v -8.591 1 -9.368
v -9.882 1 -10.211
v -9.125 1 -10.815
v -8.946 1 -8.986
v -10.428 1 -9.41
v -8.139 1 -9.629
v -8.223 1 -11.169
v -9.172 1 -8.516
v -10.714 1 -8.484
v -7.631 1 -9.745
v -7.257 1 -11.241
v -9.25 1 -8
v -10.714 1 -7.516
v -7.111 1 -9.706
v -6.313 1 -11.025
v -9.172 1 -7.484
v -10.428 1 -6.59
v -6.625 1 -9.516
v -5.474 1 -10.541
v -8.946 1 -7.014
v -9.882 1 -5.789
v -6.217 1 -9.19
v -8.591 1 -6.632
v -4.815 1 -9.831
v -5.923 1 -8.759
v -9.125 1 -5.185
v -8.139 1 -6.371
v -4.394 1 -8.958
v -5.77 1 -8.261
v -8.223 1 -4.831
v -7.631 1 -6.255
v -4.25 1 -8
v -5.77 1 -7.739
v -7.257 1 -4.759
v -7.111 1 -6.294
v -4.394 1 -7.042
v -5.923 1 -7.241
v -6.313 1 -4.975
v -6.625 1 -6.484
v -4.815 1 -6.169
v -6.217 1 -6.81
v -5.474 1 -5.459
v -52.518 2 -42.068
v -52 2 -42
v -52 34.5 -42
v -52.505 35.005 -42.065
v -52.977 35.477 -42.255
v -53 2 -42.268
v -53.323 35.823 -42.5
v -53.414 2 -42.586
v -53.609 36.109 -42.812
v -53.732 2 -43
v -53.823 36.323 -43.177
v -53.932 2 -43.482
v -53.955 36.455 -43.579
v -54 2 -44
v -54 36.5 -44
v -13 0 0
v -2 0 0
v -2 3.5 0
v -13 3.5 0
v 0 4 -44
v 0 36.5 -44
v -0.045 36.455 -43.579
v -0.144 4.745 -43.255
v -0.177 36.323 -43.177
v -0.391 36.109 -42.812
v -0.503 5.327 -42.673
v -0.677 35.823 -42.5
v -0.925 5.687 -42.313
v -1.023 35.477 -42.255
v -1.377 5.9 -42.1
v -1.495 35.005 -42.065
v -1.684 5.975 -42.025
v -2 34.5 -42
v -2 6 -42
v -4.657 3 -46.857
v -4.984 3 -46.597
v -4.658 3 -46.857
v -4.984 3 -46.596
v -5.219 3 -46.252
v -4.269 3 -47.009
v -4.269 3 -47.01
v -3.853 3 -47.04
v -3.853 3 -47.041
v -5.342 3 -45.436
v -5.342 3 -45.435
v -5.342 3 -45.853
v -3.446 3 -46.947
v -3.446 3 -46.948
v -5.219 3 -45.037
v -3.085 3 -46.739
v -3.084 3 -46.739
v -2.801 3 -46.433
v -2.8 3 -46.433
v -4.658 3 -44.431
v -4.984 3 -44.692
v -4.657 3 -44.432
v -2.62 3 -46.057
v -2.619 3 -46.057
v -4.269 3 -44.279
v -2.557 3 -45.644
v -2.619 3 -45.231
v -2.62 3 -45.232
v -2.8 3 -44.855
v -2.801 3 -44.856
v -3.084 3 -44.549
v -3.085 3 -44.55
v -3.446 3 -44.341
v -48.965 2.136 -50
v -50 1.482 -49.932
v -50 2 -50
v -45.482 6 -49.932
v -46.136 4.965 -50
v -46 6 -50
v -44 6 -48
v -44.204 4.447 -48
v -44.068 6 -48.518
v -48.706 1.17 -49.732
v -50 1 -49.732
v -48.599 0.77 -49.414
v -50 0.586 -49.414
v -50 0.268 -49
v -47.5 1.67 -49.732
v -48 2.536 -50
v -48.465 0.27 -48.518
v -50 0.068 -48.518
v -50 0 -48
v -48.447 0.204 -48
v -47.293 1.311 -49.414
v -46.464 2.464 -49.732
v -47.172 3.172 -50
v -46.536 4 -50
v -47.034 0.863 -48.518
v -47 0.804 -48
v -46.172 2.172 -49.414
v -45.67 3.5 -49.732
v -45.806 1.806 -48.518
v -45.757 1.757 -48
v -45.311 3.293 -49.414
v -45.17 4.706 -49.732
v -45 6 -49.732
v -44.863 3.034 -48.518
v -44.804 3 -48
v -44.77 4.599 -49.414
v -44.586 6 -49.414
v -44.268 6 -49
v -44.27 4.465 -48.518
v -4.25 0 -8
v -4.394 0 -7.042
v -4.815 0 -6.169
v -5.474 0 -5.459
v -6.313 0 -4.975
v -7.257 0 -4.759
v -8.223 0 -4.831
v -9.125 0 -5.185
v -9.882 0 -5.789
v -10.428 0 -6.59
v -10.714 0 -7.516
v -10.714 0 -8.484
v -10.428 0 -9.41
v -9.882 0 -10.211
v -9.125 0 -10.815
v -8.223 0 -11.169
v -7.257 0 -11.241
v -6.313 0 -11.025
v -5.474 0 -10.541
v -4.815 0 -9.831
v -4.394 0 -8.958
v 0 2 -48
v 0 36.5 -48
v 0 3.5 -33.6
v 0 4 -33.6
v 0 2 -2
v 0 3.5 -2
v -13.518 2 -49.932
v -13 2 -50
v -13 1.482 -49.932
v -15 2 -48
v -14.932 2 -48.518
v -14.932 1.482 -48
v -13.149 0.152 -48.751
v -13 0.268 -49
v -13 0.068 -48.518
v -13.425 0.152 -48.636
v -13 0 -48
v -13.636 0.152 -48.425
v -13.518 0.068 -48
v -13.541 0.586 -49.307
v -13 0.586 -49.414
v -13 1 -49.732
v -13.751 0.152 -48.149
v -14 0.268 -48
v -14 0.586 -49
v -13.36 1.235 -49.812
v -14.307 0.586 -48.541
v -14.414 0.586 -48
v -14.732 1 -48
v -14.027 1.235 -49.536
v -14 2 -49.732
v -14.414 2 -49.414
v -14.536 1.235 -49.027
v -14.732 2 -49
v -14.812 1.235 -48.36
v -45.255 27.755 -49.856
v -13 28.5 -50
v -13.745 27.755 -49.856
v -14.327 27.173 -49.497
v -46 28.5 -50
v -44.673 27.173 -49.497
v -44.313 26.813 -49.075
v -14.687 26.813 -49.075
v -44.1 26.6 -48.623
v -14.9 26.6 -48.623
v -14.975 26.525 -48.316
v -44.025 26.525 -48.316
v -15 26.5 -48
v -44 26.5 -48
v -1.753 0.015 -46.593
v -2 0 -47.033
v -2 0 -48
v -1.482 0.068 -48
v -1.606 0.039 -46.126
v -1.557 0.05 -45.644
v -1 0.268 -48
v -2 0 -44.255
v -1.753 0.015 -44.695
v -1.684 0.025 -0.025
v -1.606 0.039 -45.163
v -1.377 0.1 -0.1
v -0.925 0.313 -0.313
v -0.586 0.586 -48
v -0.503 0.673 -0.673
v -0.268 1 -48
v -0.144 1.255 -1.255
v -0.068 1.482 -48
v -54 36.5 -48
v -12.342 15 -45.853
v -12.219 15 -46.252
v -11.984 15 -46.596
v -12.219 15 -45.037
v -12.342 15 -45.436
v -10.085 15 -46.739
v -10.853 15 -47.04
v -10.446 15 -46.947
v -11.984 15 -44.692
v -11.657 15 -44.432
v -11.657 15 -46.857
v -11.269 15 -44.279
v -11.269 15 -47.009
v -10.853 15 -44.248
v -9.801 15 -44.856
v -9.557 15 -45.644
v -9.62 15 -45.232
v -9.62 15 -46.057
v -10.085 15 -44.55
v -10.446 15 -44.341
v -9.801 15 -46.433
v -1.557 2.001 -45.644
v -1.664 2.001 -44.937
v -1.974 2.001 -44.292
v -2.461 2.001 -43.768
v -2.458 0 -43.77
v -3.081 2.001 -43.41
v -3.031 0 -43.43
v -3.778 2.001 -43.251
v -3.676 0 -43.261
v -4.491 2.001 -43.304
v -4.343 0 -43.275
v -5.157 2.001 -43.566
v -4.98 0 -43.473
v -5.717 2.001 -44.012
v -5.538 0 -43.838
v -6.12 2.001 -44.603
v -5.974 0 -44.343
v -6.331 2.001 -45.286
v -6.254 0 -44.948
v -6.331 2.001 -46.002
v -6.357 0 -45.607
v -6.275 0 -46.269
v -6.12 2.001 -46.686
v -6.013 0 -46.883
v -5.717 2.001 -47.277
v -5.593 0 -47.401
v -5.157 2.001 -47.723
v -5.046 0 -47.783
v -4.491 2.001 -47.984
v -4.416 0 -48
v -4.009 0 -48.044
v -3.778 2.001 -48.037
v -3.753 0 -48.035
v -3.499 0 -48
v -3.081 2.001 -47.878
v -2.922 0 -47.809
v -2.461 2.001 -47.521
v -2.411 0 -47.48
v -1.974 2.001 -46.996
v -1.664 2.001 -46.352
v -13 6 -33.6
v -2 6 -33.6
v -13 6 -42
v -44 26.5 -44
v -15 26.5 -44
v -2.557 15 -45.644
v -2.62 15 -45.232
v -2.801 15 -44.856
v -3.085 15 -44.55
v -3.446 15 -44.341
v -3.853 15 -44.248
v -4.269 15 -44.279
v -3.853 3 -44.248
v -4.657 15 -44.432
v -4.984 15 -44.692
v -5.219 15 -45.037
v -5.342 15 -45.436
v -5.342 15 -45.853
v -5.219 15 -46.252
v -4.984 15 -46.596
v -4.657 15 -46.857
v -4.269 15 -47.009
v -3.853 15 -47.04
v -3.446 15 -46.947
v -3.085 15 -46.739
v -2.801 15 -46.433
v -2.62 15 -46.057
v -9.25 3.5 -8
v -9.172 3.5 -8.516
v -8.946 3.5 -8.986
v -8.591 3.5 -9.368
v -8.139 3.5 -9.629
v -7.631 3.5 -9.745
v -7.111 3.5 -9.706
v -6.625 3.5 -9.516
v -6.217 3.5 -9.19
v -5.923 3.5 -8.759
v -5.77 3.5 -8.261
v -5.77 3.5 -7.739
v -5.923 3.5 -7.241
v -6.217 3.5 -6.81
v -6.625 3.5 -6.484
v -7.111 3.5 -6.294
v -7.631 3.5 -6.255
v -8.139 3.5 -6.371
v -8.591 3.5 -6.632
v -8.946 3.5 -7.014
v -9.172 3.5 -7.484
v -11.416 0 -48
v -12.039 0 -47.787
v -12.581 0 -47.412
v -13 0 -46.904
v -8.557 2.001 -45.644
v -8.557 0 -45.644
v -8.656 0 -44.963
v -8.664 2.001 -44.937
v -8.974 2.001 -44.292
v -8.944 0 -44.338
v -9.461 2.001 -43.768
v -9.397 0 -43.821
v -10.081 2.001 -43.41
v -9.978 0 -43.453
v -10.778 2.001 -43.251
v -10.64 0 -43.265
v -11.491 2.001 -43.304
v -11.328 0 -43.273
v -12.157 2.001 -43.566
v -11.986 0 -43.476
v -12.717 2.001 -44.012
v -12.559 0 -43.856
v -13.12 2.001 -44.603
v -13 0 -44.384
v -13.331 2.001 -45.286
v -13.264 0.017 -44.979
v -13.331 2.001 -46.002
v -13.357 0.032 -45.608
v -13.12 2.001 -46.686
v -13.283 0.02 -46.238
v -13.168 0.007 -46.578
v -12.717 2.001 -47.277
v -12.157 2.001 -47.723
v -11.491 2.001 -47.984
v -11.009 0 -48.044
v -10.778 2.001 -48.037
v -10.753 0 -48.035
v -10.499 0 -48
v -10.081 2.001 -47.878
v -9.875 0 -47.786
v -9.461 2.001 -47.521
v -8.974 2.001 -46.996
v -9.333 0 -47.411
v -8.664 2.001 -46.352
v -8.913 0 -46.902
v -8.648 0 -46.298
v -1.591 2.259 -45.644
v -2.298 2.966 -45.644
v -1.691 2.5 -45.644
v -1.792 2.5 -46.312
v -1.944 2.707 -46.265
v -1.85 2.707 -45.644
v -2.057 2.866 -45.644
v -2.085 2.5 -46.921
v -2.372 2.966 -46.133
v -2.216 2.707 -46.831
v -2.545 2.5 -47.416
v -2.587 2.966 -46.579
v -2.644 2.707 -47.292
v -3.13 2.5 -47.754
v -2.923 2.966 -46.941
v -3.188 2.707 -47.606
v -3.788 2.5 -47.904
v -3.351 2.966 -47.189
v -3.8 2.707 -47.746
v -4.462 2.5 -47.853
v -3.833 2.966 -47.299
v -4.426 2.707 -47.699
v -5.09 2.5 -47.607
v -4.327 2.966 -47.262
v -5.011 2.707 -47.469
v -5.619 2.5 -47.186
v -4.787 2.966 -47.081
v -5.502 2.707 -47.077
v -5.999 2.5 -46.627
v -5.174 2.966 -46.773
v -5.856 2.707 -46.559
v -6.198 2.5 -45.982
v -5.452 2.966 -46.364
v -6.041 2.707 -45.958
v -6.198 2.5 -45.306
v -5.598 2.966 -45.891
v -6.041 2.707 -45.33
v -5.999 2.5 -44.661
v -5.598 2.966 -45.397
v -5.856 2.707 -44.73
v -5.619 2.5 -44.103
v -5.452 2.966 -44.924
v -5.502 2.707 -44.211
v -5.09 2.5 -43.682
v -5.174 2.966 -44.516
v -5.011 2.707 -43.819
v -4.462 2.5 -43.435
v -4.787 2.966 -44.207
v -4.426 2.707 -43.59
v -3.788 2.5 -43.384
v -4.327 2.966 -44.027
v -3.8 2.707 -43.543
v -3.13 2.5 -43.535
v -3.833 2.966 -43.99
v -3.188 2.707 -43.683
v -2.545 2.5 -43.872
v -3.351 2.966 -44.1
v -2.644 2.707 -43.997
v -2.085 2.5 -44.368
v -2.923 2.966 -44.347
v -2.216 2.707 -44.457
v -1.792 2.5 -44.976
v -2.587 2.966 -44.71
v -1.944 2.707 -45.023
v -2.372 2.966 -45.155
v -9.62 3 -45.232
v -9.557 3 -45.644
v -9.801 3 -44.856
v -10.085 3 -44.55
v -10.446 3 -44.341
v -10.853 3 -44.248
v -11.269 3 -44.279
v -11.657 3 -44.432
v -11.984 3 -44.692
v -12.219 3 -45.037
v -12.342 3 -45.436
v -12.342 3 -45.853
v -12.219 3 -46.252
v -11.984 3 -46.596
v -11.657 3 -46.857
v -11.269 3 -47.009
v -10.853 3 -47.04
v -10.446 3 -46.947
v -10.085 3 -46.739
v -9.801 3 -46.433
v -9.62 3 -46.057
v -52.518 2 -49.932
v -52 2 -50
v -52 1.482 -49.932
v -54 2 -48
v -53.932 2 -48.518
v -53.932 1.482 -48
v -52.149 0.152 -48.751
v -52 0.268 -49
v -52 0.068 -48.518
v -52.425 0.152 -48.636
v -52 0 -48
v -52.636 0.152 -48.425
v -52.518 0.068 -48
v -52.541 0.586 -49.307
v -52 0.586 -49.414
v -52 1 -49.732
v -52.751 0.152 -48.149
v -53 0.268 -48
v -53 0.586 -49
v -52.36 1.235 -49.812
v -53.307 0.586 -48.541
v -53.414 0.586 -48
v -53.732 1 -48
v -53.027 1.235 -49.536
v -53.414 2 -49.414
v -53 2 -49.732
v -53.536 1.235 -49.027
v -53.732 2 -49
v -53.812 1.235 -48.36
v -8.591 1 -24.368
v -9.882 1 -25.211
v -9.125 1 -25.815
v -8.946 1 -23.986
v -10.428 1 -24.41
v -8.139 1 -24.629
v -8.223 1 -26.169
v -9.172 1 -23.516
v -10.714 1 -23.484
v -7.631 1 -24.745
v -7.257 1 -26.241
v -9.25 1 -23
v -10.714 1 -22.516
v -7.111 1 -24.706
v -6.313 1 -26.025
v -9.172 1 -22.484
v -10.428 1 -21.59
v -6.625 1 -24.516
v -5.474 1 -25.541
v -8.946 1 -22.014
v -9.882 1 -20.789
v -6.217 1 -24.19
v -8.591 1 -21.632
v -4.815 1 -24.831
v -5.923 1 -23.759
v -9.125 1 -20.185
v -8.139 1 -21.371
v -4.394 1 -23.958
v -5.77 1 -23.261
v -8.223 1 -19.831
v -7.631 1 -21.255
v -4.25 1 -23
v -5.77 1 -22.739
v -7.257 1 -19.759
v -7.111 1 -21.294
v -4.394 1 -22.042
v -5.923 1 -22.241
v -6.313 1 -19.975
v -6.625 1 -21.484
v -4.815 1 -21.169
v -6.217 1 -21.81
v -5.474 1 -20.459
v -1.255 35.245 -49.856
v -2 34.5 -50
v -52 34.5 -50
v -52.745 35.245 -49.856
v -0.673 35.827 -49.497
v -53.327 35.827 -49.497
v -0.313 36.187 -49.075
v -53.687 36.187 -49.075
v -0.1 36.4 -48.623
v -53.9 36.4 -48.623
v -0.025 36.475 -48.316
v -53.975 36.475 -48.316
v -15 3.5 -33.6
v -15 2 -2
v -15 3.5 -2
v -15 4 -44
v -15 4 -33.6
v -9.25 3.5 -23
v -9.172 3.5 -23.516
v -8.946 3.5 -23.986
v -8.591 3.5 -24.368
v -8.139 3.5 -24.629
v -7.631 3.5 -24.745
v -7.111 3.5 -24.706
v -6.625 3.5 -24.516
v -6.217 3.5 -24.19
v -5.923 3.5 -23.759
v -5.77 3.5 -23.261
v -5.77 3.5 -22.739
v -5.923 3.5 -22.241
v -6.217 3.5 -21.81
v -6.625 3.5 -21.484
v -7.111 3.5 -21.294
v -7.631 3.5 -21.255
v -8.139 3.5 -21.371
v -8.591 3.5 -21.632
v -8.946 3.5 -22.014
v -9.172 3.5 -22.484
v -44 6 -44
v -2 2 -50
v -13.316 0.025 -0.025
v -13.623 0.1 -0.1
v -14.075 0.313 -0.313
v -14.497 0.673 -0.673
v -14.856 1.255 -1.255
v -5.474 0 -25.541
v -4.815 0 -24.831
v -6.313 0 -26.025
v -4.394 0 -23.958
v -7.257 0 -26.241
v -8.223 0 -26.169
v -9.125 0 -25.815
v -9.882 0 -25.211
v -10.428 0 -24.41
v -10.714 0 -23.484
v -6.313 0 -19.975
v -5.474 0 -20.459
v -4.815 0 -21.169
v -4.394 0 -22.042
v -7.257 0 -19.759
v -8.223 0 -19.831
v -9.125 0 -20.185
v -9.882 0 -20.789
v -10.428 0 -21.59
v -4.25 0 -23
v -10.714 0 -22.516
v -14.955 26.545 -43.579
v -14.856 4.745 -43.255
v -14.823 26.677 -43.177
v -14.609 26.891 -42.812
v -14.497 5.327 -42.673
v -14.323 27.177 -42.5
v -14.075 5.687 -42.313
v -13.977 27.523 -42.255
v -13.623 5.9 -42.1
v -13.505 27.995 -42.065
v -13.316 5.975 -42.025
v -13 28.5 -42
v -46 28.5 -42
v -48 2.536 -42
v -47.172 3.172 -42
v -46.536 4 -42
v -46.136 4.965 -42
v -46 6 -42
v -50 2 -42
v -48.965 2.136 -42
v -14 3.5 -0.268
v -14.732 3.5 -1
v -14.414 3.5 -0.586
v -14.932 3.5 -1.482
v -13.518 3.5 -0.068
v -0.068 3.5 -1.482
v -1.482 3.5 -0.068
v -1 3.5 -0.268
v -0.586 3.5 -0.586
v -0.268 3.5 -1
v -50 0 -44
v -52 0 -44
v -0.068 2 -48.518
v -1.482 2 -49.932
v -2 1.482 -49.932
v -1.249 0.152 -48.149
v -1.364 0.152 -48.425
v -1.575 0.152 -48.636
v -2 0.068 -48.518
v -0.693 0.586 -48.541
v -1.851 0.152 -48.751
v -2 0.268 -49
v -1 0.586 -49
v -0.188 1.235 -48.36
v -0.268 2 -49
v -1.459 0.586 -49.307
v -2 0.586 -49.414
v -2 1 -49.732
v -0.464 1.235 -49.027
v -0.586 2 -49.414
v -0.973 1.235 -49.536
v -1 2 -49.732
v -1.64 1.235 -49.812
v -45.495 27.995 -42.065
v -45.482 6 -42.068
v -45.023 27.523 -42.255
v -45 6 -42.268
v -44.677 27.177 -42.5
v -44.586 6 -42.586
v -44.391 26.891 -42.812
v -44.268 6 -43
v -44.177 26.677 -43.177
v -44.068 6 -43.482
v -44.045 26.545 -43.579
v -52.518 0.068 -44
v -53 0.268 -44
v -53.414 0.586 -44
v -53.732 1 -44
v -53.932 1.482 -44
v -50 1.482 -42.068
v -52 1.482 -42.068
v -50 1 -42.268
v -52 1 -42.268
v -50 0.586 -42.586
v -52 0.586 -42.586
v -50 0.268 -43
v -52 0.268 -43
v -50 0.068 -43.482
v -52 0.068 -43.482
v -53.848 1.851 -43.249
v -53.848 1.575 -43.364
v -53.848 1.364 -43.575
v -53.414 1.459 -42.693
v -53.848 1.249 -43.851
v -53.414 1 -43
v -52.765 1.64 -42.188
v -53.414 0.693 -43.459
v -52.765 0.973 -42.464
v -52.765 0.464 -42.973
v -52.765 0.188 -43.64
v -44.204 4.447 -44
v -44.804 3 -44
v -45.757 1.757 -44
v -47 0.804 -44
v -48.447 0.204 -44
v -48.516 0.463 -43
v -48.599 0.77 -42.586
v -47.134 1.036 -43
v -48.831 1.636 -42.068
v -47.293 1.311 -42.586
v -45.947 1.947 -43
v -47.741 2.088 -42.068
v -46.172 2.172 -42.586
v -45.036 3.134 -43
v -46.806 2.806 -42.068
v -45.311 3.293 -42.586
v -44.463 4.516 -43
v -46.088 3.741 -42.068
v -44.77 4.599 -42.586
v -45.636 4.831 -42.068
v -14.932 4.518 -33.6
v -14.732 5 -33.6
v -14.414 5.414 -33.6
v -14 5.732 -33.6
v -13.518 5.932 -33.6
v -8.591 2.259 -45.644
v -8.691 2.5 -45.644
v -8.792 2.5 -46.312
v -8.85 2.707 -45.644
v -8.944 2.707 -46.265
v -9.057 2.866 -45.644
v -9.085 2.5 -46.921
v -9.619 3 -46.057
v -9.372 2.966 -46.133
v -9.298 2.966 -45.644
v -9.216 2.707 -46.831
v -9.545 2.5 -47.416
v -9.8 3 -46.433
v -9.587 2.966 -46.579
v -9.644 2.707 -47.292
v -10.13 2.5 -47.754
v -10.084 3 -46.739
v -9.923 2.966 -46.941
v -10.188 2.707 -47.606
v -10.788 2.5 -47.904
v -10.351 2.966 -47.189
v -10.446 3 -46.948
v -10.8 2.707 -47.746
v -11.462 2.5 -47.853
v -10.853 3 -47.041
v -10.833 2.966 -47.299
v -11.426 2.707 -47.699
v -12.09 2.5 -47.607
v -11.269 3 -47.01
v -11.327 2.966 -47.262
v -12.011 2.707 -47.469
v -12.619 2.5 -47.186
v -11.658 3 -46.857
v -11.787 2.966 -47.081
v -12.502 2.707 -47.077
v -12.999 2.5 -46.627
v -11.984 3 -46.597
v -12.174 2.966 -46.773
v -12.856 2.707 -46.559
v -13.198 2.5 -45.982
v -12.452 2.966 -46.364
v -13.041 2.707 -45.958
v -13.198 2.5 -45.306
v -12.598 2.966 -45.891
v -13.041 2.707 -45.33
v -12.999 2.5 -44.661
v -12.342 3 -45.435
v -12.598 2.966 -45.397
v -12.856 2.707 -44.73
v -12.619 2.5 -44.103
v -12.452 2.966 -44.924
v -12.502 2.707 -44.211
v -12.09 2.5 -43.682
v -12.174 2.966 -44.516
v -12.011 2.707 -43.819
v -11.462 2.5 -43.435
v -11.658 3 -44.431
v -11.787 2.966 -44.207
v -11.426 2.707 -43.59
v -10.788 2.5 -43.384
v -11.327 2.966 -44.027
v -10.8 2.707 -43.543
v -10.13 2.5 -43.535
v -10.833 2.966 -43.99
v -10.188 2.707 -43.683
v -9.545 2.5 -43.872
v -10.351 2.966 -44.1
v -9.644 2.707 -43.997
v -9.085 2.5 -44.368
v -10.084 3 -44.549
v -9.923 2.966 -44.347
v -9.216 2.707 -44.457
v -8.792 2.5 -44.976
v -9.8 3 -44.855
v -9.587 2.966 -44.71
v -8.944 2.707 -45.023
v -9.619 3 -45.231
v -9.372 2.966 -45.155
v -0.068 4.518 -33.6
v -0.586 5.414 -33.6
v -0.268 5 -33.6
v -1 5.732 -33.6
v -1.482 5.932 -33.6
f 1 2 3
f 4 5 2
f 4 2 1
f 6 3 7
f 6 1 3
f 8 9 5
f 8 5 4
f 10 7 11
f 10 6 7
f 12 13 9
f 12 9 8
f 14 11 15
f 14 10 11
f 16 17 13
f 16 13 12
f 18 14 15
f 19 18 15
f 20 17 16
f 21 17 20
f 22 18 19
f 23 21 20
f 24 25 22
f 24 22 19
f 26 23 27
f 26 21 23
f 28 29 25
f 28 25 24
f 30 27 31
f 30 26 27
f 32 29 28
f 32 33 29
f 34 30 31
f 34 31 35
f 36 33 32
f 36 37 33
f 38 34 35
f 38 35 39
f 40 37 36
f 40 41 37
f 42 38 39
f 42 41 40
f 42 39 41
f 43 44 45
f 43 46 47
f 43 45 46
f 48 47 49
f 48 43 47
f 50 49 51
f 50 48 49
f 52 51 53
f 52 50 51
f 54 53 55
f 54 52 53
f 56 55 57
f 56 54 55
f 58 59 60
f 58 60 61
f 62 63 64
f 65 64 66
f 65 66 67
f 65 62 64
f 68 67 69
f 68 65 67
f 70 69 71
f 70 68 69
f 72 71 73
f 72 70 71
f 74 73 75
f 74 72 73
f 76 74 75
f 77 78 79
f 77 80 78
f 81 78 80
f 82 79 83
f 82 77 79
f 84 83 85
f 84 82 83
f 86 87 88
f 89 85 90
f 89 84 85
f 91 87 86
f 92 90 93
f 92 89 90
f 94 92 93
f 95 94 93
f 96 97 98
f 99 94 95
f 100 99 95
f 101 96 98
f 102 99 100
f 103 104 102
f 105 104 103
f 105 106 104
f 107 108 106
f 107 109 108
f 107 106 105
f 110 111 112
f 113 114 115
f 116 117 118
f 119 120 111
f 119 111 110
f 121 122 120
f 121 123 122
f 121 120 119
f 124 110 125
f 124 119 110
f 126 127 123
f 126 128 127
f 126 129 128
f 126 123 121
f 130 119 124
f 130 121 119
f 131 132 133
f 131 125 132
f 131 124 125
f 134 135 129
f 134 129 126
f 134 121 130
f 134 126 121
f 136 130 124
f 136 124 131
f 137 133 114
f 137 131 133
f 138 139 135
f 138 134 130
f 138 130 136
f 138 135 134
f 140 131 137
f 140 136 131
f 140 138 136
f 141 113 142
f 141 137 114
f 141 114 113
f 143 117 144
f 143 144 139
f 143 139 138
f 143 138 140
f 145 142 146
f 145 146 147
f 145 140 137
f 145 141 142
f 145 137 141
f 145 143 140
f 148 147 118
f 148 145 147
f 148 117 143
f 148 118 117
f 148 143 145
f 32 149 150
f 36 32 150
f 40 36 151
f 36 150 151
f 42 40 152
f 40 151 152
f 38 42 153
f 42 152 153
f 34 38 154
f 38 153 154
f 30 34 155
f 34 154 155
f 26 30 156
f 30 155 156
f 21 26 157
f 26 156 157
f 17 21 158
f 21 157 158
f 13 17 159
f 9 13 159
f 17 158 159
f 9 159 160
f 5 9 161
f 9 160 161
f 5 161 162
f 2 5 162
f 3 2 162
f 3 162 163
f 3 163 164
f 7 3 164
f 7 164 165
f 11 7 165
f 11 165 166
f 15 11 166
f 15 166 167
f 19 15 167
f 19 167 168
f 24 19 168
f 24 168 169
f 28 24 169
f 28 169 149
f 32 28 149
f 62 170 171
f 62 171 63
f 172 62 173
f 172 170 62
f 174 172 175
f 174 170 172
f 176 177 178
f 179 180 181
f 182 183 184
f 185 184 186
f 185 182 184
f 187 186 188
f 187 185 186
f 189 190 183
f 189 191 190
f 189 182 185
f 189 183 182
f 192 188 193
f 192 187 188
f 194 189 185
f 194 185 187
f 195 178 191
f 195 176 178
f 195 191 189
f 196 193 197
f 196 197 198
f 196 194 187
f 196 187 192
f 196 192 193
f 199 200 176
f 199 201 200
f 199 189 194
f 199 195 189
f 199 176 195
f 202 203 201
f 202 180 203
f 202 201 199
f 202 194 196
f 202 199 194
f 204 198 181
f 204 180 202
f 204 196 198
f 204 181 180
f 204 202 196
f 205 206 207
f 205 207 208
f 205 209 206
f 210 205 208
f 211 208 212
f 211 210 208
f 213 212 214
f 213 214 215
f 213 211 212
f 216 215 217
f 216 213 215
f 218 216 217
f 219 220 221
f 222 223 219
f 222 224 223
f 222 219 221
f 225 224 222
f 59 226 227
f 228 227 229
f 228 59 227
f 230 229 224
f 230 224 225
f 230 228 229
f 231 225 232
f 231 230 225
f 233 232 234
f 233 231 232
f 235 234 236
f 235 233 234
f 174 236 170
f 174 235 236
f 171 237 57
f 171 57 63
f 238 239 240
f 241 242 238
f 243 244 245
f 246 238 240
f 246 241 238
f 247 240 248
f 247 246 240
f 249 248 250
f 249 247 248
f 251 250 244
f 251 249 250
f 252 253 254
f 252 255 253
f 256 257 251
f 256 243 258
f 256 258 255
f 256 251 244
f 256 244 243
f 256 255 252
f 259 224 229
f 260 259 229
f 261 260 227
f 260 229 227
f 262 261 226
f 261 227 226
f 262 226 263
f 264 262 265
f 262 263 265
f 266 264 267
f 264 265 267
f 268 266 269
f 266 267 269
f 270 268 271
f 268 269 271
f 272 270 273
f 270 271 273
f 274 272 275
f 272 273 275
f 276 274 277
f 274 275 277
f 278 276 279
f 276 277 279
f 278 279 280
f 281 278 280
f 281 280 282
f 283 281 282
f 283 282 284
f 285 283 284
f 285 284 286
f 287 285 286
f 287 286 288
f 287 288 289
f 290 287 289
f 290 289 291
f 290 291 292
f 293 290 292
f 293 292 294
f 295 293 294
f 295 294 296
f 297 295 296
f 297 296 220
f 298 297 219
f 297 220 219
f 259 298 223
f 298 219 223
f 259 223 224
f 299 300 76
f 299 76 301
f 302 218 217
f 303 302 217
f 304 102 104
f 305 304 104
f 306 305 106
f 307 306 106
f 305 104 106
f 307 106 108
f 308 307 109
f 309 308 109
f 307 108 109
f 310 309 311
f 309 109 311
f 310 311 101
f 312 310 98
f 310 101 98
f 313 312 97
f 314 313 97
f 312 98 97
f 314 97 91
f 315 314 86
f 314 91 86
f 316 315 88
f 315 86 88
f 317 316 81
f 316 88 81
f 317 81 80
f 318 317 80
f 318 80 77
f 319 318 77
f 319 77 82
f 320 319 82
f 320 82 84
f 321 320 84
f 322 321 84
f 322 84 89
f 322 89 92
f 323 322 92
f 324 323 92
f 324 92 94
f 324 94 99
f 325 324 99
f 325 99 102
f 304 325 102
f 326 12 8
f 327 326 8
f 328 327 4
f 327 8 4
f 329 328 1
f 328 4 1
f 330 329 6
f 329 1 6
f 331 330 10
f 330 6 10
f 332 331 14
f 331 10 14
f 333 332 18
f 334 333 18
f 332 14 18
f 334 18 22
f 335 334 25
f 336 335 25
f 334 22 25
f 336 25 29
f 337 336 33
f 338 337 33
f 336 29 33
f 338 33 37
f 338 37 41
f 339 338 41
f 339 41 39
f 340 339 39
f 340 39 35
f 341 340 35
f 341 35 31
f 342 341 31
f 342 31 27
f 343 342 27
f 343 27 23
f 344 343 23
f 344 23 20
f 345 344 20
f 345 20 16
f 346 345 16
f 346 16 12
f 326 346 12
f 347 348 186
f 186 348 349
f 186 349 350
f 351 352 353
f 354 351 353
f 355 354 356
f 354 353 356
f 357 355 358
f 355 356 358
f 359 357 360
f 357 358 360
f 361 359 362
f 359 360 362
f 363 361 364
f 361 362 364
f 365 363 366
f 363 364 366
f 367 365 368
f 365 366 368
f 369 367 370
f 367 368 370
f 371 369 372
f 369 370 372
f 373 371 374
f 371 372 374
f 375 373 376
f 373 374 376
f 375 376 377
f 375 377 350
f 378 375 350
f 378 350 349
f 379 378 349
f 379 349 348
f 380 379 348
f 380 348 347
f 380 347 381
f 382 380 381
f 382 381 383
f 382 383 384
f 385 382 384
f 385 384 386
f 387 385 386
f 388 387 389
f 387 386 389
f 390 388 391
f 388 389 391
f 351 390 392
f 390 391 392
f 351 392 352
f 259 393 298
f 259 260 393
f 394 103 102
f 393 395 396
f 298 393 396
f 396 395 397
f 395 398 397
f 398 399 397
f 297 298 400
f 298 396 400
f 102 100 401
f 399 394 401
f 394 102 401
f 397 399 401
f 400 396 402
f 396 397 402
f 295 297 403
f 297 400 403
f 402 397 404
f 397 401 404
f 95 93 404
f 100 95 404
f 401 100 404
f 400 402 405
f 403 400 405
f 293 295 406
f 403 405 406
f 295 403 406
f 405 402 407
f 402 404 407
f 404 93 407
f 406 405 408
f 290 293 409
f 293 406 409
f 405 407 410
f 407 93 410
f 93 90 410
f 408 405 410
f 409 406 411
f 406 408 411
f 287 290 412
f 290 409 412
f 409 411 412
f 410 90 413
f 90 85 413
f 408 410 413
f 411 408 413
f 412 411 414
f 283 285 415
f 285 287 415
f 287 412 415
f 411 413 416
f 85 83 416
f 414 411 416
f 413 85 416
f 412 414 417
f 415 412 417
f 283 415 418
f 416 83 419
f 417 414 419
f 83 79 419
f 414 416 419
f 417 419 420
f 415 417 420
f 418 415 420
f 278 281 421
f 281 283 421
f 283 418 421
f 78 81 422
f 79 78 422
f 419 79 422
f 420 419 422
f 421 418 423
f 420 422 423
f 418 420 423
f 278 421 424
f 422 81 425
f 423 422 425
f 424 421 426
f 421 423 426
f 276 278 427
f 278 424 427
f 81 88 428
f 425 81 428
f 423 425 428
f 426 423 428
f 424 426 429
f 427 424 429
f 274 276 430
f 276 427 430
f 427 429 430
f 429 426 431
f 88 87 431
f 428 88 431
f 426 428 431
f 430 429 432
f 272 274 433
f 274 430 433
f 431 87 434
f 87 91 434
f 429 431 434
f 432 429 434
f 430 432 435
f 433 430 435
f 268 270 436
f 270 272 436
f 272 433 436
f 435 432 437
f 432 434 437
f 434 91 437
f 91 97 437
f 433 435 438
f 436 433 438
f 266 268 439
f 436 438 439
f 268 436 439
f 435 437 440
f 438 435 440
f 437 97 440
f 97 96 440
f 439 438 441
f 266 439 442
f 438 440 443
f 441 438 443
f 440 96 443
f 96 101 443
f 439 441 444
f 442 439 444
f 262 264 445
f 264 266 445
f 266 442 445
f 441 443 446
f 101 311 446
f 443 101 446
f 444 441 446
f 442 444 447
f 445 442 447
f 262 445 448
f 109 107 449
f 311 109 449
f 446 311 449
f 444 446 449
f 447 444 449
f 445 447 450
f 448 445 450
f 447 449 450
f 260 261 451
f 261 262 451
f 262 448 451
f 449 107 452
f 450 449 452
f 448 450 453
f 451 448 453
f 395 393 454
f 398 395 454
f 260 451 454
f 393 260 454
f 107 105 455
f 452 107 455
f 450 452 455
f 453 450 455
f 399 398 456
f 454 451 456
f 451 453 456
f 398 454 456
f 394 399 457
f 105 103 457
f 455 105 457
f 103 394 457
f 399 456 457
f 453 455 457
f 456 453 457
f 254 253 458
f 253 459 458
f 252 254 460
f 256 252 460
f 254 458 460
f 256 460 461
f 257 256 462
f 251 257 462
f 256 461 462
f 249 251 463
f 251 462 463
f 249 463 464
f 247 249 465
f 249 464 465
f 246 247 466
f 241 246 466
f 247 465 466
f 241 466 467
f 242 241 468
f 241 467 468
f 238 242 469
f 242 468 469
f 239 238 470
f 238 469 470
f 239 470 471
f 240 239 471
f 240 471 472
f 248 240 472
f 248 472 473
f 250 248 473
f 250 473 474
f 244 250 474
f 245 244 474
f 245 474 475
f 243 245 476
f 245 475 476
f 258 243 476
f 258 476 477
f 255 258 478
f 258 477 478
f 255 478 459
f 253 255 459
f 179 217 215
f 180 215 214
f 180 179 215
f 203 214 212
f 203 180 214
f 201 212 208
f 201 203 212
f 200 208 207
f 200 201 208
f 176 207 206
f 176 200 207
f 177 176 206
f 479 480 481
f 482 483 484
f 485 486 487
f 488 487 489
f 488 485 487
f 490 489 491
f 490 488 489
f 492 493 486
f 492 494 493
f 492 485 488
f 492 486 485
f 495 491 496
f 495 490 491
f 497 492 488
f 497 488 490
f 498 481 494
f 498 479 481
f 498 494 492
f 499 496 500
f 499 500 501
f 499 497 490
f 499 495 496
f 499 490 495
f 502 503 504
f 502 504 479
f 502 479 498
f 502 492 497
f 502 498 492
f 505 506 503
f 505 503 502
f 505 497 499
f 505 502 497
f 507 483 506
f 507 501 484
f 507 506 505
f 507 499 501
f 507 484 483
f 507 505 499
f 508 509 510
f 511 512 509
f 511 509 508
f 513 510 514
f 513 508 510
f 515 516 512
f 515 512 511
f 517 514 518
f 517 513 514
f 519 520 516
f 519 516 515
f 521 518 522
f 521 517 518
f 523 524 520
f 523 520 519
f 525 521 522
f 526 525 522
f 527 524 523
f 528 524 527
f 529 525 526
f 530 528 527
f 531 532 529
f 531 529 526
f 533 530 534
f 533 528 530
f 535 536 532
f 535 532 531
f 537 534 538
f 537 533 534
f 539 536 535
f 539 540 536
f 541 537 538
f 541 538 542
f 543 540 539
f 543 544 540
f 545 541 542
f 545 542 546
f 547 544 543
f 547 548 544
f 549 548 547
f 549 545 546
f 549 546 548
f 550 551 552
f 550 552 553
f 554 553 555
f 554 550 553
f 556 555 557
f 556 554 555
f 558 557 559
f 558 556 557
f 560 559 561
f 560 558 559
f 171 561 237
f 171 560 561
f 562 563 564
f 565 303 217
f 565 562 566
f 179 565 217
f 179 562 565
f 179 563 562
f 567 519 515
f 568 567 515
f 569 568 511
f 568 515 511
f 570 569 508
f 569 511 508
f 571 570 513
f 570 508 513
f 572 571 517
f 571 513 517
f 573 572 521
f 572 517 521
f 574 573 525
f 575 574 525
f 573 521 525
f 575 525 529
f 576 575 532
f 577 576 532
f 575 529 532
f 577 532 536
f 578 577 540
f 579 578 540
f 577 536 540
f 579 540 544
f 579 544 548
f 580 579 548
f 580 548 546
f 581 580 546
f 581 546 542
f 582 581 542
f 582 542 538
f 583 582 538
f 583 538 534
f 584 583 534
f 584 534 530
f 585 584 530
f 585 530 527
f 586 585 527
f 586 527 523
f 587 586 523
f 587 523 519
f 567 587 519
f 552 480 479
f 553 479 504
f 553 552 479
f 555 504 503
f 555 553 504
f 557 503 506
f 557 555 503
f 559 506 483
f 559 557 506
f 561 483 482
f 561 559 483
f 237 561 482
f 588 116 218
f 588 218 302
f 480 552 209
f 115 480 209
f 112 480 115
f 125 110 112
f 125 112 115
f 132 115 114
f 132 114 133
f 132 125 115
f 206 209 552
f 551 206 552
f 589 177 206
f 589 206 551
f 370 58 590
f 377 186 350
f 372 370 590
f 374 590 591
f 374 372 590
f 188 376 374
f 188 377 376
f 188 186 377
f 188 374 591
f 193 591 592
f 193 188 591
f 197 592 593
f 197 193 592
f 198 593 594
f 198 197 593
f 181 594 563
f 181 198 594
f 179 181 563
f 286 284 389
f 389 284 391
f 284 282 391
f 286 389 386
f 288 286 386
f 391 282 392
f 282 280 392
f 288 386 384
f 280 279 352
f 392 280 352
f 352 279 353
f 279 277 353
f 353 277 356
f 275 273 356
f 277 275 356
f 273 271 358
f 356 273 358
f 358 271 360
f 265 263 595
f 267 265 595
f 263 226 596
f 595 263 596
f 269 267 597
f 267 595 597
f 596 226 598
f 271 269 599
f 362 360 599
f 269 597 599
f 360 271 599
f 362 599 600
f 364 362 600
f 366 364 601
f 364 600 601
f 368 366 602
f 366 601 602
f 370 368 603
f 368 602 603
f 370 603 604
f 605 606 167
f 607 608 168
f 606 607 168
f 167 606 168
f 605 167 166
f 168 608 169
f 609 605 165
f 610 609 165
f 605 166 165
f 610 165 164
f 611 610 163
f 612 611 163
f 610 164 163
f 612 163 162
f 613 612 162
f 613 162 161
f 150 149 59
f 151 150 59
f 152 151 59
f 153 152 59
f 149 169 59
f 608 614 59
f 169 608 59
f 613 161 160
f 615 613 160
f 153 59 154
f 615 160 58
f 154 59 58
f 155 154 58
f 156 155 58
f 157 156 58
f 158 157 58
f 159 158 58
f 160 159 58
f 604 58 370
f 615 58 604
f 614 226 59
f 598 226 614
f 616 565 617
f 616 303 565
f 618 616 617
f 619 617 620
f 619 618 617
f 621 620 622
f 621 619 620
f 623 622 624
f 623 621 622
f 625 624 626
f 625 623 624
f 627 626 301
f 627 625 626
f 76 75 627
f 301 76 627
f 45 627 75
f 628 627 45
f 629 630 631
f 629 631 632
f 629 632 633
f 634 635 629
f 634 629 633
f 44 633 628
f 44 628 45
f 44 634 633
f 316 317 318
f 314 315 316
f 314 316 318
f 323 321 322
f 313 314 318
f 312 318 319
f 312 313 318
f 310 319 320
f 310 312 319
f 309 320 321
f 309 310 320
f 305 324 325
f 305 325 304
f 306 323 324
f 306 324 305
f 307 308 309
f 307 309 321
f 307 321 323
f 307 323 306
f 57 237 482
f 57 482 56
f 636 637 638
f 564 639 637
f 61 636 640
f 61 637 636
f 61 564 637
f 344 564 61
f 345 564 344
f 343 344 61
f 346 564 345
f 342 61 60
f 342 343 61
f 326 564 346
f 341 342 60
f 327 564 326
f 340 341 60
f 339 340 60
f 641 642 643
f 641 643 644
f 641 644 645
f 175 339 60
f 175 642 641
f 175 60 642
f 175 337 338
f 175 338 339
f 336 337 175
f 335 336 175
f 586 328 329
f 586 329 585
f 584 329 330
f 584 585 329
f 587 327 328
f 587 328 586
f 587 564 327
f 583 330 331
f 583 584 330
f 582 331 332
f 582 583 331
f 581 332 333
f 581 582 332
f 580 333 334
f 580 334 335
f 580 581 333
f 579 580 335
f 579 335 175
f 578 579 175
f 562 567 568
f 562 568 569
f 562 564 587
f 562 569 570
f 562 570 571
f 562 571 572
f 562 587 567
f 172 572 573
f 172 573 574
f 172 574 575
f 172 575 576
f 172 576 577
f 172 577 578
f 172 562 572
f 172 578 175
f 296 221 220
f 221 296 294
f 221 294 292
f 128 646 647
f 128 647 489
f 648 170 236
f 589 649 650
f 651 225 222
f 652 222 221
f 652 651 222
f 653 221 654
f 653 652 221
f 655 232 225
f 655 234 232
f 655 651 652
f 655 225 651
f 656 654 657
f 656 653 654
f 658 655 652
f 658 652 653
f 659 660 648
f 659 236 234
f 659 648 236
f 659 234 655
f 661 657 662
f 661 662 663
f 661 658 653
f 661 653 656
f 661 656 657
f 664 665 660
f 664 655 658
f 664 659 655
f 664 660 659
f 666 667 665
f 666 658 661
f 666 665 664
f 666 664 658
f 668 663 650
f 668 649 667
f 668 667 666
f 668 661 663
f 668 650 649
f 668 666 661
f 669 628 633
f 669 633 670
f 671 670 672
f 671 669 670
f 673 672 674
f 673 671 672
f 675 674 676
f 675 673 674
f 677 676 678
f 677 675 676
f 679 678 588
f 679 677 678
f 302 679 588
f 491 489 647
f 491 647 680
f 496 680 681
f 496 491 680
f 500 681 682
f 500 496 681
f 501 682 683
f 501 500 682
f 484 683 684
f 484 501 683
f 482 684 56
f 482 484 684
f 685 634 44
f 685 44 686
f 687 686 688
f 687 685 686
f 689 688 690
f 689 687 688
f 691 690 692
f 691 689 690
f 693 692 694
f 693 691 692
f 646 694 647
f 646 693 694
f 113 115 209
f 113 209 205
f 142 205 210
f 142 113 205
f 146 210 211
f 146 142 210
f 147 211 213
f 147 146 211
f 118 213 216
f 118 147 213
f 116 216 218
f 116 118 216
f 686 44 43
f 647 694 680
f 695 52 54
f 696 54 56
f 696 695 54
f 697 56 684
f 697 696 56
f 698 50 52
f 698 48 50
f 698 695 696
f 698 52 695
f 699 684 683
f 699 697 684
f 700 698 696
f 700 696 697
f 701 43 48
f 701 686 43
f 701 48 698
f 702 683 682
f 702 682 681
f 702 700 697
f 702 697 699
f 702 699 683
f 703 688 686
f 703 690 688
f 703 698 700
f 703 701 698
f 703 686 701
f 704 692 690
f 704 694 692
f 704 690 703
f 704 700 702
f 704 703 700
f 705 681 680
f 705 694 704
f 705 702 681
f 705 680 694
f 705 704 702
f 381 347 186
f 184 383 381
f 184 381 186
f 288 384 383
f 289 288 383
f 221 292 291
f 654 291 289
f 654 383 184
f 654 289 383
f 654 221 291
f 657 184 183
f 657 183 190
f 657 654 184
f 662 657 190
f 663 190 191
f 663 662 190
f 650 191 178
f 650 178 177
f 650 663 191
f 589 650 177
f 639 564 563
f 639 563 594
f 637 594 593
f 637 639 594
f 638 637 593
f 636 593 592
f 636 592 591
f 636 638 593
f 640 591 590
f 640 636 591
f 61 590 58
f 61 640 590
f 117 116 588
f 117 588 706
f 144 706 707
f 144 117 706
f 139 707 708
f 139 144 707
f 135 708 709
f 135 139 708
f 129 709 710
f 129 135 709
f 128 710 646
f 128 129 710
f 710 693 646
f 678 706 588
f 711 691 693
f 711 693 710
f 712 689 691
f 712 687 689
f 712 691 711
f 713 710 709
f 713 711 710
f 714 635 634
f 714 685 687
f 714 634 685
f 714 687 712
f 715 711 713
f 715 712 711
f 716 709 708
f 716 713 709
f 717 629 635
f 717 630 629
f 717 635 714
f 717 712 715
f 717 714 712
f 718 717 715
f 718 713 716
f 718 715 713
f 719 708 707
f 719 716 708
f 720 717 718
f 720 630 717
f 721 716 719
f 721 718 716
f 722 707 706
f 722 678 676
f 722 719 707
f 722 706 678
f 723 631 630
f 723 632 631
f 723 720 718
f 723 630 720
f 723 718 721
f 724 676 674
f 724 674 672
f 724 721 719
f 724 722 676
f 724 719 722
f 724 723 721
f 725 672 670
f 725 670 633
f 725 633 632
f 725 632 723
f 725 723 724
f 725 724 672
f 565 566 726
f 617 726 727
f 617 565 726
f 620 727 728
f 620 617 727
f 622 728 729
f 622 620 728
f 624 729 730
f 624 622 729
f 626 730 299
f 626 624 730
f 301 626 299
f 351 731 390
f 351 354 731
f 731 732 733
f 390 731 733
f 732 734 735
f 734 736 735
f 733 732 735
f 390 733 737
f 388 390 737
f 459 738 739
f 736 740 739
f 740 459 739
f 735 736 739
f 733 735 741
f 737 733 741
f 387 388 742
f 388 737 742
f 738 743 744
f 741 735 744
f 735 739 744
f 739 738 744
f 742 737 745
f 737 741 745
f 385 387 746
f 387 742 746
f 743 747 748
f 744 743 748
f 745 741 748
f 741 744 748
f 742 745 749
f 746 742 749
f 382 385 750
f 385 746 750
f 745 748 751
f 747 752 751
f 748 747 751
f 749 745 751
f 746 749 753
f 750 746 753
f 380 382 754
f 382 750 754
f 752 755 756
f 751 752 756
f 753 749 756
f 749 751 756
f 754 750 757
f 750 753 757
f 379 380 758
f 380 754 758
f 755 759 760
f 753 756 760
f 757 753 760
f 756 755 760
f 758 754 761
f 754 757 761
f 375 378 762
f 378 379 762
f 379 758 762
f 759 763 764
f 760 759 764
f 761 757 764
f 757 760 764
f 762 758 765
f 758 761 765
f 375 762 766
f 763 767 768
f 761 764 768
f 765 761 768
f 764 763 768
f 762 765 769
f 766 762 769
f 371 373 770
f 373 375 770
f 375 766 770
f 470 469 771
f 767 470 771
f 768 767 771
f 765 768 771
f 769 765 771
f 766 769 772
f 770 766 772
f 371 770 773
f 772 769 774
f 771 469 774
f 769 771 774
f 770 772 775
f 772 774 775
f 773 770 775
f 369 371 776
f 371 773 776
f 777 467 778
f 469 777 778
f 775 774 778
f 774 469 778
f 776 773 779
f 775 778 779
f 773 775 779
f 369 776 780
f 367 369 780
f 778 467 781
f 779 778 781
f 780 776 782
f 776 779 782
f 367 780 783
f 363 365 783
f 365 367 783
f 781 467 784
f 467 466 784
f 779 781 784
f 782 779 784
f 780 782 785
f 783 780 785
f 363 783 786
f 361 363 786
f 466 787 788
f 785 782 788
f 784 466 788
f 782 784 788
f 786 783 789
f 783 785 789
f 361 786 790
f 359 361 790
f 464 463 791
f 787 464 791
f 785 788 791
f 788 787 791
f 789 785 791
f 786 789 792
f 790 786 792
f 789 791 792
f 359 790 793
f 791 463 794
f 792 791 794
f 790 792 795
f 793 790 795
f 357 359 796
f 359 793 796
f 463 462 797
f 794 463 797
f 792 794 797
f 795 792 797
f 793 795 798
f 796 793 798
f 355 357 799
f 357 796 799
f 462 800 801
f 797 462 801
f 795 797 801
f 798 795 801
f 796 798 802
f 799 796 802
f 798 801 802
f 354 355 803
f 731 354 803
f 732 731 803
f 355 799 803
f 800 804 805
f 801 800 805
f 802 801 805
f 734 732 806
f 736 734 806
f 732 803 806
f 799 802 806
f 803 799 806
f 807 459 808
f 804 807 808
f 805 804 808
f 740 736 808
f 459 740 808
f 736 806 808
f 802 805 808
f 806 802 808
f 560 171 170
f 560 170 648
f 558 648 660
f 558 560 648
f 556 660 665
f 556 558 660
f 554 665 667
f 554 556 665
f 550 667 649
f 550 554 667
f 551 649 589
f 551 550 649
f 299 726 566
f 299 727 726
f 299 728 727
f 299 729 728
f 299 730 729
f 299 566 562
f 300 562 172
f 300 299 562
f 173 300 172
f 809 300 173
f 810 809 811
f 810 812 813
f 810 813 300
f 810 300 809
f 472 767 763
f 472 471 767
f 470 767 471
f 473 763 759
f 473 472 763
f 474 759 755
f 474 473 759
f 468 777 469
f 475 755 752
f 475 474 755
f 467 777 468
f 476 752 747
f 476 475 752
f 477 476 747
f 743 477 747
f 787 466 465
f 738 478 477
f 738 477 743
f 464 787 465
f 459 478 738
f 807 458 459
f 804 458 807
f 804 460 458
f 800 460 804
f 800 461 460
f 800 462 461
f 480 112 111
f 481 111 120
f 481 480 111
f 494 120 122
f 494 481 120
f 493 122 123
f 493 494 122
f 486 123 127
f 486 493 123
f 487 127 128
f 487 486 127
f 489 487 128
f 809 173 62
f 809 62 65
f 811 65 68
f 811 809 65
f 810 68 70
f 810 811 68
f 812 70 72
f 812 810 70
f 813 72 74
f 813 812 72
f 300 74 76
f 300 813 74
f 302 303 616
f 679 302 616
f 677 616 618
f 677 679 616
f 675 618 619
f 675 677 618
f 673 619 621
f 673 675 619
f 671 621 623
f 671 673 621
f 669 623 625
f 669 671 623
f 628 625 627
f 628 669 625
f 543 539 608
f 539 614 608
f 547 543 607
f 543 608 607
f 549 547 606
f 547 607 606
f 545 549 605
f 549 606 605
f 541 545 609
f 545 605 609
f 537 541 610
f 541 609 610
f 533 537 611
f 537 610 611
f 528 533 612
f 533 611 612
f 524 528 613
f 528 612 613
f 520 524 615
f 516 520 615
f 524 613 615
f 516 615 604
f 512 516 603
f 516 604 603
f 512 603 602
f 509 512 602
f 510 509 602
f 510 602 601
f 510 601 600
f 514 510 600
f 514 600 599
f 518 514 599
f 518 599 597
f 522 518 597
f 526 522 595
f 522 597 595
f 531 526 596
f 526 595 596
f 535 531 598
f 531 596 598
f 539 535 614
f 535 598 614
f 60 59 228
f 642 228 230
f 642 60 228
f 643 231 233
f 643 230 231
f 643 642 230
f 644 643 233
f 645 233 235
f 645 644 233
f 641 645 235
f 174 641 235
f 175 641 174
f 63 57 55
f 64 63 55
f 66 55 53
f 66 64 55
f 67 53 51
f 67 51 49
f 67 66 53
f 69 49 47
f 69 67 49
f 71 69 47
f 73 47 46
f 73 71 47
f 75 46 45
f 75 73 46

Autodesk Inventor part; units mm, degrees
ref_plane "YZ Plane" through (0, 0, 0) normal (1, 0, 0) x (0, 1, 0)
ref_plane "XZ Plane" through (0, 0, 0) normal (0, 1, 0) x (-1, 0, 0)
ref_plane "XY Plane" through (0, 0, 0) normal (0, 0, 1) x (1, 0, 0)
sketch "スケッチ1" plane through (0, 0, 0) normal (0, 1, 0) x (-1, 0, 0)
  line L0 (0, 0) -> (15, 0)
  line L1 (15, 0) -> (15, -50)
  line L2 (15, -50) -> (0, -50)
  line L3 (0, -50) -> (0, 0)
  circle A0 centre (7.5, -8) radius 1.75
  circle A1 centre (7.5, -23) radius 1.75
  dimension "d0" = 15
  dimension "d1" = 50
  dimension "d2" = 15
  dimension "d3" = 3.5
  dimension "d4" = 3.5
  dimension "d5" = 0
  dimension "d6" = 7.5
  dimension "d7" = 8
extrude "押し出し1" add sketch "スケッチ1" along normal blind 6
sketch "スケッチ2" plane through (0, 6, 0) normal (0, 1, 0) x (1, 0, 0)
  line L0 (0, 0) -> (0, 50) projected
  line L1 (0, 50) -> (-15, 50) projected
  line L2 (-15, 50) -> (0, 50)
  line L3 (0, 50) -> (0, 42)
  line L4 (0, 42) -> (-15, 42)
  line L5 (-15, 42) -> (-15, 50)
  dimension "d10" = 8
extrude "押し出し2" add sketch "スケッチ2" along normal blind 20.5
sketch "スケッチ3" plane through (0, 26.5, 0) normal (0, 1, 0) x (1, 0, 0)
  line L0 (-15, 50) -> (-15, 42) projected
  line L1 (0, 42) -> (-44, 42)
  line L2 (-44, 42) -> (-44, 50)
  line L3 (-44, 50) -> (0, 50)
  line L4 (0, 50) -> (0, 42)
  point P0 (0, 0)
  dimension "d13" = 29
  dimension "d14" = 8
extrude "押し出し3" add sketch "スケッチ3" along normal blind 10
sketch "スケッチ4" plane through (-44, 26.5, -50) normal (-1, 0, 0) x (0, 0, 1)
  line L0 (50, -26.5) -> (0, -26.5) projected
  line L1 (50, -26.5) -> (50, -20.5) projected
  line L2 (8, -20.5) -> (50, -20.5) projected
  line L3 (8, -20.5) -> (8, 0) projected
  line L4 (0, 0) -> (8, 0) projected
  line L5 (0, -26.5) -> (0, 0) projected
  line L6 (8, 10) -> (0, 10)
  line L7 (0, 10) -> (0, -26.5)
  line L8 (0, -26.5) -> (8, -26.5)
  line L9 (8, -26.5) -> (8, 10)
  point P0 (50, -26.5)
extrude "押し出し4" add sketch "スケッチ4" along normal blind 10 contours L0 L5 L4 L3 L9 | L7 L6 L9 L4
fillet "フィレット1" radius 6 1 edges at (-44, 0, -46)
fillet "フィレット2" radius 2 23 edges at (-44, 16.25, -42) (-52, 0, -42) (-29.5, 26.5, -42) (-15, 16.25, -42) (0, 18.25, -50) (-27, 36.5, -50) (-54, 18.25, -42) (-54, 18.25, -50) (-54, 0, -46) (-44, 16.25, -50) (-52, 0, -50) (-15, 6, -21) (-7.5, 6, 0) (0, 6, -21) (0, 3, 0) (-15, 13.25, -50) (0, 21.25, -42) (-27, 36.5, -42) (-15, 3, 0) (-29.5, 26.5, -50) (-7.5, 0, -50) (-15, 0, -25) (0, 0, -25)
sketch "スケッチ5" plane through (0, 6, 0) normal (0, 1, 0) x (1, 0, 0)
  circle A0 centre (-7.5, 8) radius 1.75 projected
  circle A1 centre (-7.5, 23) radius 1.75 projected
  line L0 (-15, 44) -> (-15, 2) projected
  line L1 (-15, 2) -> (-13, 2) projected
  line L2 (-13, 2) -> (-13, 42) projected
  arc A2 (-15, 44) -> (-13, 42) centre (-13, 44) ccw projected
  line L3 (-2, 42) -> (-2, 2) projected
  line L4 (-2, 2) -> (0, 2) projected
  line L5 (0, 2) -> (0, 44) projected
  arc A3 (-2, 42) -> (0, 44) centre (-2, 44) ccw projected
  line L6 (-2, 0) -> (-2, 2) projected
  line L7 (-2, 2) -> (-13, 2) projected
  line L8 (-13, 2) -> (-13, 0) projected
  line L9 (-13, 0) -> (-2, 0) projected
  line L10 (-15, 33.6) -> (0, 33.6)
  line L11 (0, 33.6) -> (0, -0.8351)
  line L12 (0, -0.8351) -> (-15, -0.8351)
  line L13 (-15, -0.8351) -> (-15, 33.6)
  point P0 (0, 0)
  dimension "d21" = 10.6
extrude "押し出し5" cut sketch "スケッチ5" against normal blind 2.5 contours A0 | A1 | L10 L2 L1 L0 | L1 L8 L9 L6 L4 L11 L12 L13 | L10 L3 L7 L2 | L7 L6 L9 L8 | L10 L5 L4 L3
sketch "スケッチ6" plane through (0, 0, 0) normal (0, -1, 0) x (1, 0, 0)
  circle A0 centre (-10.9574, -45.6442) radius 1.4
  circle A1 centre (-3.9574, -45.6442) radius 1.4
  point P0 (0, 0)
  dimension "d24" = 2.8
  dimension "d25" = 2.8
  dimension "d26" = 0
  dimension "d27" = 7
extrude "押し出し6" cut sketch "スケッチ6" against normal blind 15
sketch "スケッチ7" plane through (0, 0, 0) normal (0, -1, 0) x (1, 0, 0)
  circle A0 centre (-10.9574, -45.6442) radius 1.4 projected
  circle A1 centre (-3.9574, -45.6442) radius 1.4 projected
  circle A2 centre (-10.9574, -45.6442) radius 2.4
  circle A3 centre (-3.9574, -45.6442) radius 2.4
  point P0 (0, 0)
  dimension "d30" = 1
  dimension "d31" = 1
extrude "押し出し7" cut sketch "スケッチ7" against normal blind 3
fillet "フィレット3" radius 1 2 edges at (-13.3574, 3, -45.6442) (-6.3574, 3, -45.6442)
sketch "スケッチ8" plane through (0, 0, 0) normal (0, -1, 0) x (1, 0, 0)
  circle A0 centre (-7.5, -23) radius 1.75 projected
  circle A1 centre (-7.5, -8) radius 1.75 projected
  circle A2 centre (-7.5, -8) radius 3.25
  circle A3 centre (-7.5, -23) radius 3.25
  point P0 (0, 0)
  dimension "d35" = 1.5
  dimension "d36" = 1.5
extrude "押し出し8" cut sketch "スケッチ8" against normal blind 1
equation "\"d4\" = d3"
equation "\"d6\" = 0.5 * d0"
equation "\"d25\" = d24"
equation "\"d31\" = d30"
equation "\"d36\" = d35"
properties part number "bed-hook"
